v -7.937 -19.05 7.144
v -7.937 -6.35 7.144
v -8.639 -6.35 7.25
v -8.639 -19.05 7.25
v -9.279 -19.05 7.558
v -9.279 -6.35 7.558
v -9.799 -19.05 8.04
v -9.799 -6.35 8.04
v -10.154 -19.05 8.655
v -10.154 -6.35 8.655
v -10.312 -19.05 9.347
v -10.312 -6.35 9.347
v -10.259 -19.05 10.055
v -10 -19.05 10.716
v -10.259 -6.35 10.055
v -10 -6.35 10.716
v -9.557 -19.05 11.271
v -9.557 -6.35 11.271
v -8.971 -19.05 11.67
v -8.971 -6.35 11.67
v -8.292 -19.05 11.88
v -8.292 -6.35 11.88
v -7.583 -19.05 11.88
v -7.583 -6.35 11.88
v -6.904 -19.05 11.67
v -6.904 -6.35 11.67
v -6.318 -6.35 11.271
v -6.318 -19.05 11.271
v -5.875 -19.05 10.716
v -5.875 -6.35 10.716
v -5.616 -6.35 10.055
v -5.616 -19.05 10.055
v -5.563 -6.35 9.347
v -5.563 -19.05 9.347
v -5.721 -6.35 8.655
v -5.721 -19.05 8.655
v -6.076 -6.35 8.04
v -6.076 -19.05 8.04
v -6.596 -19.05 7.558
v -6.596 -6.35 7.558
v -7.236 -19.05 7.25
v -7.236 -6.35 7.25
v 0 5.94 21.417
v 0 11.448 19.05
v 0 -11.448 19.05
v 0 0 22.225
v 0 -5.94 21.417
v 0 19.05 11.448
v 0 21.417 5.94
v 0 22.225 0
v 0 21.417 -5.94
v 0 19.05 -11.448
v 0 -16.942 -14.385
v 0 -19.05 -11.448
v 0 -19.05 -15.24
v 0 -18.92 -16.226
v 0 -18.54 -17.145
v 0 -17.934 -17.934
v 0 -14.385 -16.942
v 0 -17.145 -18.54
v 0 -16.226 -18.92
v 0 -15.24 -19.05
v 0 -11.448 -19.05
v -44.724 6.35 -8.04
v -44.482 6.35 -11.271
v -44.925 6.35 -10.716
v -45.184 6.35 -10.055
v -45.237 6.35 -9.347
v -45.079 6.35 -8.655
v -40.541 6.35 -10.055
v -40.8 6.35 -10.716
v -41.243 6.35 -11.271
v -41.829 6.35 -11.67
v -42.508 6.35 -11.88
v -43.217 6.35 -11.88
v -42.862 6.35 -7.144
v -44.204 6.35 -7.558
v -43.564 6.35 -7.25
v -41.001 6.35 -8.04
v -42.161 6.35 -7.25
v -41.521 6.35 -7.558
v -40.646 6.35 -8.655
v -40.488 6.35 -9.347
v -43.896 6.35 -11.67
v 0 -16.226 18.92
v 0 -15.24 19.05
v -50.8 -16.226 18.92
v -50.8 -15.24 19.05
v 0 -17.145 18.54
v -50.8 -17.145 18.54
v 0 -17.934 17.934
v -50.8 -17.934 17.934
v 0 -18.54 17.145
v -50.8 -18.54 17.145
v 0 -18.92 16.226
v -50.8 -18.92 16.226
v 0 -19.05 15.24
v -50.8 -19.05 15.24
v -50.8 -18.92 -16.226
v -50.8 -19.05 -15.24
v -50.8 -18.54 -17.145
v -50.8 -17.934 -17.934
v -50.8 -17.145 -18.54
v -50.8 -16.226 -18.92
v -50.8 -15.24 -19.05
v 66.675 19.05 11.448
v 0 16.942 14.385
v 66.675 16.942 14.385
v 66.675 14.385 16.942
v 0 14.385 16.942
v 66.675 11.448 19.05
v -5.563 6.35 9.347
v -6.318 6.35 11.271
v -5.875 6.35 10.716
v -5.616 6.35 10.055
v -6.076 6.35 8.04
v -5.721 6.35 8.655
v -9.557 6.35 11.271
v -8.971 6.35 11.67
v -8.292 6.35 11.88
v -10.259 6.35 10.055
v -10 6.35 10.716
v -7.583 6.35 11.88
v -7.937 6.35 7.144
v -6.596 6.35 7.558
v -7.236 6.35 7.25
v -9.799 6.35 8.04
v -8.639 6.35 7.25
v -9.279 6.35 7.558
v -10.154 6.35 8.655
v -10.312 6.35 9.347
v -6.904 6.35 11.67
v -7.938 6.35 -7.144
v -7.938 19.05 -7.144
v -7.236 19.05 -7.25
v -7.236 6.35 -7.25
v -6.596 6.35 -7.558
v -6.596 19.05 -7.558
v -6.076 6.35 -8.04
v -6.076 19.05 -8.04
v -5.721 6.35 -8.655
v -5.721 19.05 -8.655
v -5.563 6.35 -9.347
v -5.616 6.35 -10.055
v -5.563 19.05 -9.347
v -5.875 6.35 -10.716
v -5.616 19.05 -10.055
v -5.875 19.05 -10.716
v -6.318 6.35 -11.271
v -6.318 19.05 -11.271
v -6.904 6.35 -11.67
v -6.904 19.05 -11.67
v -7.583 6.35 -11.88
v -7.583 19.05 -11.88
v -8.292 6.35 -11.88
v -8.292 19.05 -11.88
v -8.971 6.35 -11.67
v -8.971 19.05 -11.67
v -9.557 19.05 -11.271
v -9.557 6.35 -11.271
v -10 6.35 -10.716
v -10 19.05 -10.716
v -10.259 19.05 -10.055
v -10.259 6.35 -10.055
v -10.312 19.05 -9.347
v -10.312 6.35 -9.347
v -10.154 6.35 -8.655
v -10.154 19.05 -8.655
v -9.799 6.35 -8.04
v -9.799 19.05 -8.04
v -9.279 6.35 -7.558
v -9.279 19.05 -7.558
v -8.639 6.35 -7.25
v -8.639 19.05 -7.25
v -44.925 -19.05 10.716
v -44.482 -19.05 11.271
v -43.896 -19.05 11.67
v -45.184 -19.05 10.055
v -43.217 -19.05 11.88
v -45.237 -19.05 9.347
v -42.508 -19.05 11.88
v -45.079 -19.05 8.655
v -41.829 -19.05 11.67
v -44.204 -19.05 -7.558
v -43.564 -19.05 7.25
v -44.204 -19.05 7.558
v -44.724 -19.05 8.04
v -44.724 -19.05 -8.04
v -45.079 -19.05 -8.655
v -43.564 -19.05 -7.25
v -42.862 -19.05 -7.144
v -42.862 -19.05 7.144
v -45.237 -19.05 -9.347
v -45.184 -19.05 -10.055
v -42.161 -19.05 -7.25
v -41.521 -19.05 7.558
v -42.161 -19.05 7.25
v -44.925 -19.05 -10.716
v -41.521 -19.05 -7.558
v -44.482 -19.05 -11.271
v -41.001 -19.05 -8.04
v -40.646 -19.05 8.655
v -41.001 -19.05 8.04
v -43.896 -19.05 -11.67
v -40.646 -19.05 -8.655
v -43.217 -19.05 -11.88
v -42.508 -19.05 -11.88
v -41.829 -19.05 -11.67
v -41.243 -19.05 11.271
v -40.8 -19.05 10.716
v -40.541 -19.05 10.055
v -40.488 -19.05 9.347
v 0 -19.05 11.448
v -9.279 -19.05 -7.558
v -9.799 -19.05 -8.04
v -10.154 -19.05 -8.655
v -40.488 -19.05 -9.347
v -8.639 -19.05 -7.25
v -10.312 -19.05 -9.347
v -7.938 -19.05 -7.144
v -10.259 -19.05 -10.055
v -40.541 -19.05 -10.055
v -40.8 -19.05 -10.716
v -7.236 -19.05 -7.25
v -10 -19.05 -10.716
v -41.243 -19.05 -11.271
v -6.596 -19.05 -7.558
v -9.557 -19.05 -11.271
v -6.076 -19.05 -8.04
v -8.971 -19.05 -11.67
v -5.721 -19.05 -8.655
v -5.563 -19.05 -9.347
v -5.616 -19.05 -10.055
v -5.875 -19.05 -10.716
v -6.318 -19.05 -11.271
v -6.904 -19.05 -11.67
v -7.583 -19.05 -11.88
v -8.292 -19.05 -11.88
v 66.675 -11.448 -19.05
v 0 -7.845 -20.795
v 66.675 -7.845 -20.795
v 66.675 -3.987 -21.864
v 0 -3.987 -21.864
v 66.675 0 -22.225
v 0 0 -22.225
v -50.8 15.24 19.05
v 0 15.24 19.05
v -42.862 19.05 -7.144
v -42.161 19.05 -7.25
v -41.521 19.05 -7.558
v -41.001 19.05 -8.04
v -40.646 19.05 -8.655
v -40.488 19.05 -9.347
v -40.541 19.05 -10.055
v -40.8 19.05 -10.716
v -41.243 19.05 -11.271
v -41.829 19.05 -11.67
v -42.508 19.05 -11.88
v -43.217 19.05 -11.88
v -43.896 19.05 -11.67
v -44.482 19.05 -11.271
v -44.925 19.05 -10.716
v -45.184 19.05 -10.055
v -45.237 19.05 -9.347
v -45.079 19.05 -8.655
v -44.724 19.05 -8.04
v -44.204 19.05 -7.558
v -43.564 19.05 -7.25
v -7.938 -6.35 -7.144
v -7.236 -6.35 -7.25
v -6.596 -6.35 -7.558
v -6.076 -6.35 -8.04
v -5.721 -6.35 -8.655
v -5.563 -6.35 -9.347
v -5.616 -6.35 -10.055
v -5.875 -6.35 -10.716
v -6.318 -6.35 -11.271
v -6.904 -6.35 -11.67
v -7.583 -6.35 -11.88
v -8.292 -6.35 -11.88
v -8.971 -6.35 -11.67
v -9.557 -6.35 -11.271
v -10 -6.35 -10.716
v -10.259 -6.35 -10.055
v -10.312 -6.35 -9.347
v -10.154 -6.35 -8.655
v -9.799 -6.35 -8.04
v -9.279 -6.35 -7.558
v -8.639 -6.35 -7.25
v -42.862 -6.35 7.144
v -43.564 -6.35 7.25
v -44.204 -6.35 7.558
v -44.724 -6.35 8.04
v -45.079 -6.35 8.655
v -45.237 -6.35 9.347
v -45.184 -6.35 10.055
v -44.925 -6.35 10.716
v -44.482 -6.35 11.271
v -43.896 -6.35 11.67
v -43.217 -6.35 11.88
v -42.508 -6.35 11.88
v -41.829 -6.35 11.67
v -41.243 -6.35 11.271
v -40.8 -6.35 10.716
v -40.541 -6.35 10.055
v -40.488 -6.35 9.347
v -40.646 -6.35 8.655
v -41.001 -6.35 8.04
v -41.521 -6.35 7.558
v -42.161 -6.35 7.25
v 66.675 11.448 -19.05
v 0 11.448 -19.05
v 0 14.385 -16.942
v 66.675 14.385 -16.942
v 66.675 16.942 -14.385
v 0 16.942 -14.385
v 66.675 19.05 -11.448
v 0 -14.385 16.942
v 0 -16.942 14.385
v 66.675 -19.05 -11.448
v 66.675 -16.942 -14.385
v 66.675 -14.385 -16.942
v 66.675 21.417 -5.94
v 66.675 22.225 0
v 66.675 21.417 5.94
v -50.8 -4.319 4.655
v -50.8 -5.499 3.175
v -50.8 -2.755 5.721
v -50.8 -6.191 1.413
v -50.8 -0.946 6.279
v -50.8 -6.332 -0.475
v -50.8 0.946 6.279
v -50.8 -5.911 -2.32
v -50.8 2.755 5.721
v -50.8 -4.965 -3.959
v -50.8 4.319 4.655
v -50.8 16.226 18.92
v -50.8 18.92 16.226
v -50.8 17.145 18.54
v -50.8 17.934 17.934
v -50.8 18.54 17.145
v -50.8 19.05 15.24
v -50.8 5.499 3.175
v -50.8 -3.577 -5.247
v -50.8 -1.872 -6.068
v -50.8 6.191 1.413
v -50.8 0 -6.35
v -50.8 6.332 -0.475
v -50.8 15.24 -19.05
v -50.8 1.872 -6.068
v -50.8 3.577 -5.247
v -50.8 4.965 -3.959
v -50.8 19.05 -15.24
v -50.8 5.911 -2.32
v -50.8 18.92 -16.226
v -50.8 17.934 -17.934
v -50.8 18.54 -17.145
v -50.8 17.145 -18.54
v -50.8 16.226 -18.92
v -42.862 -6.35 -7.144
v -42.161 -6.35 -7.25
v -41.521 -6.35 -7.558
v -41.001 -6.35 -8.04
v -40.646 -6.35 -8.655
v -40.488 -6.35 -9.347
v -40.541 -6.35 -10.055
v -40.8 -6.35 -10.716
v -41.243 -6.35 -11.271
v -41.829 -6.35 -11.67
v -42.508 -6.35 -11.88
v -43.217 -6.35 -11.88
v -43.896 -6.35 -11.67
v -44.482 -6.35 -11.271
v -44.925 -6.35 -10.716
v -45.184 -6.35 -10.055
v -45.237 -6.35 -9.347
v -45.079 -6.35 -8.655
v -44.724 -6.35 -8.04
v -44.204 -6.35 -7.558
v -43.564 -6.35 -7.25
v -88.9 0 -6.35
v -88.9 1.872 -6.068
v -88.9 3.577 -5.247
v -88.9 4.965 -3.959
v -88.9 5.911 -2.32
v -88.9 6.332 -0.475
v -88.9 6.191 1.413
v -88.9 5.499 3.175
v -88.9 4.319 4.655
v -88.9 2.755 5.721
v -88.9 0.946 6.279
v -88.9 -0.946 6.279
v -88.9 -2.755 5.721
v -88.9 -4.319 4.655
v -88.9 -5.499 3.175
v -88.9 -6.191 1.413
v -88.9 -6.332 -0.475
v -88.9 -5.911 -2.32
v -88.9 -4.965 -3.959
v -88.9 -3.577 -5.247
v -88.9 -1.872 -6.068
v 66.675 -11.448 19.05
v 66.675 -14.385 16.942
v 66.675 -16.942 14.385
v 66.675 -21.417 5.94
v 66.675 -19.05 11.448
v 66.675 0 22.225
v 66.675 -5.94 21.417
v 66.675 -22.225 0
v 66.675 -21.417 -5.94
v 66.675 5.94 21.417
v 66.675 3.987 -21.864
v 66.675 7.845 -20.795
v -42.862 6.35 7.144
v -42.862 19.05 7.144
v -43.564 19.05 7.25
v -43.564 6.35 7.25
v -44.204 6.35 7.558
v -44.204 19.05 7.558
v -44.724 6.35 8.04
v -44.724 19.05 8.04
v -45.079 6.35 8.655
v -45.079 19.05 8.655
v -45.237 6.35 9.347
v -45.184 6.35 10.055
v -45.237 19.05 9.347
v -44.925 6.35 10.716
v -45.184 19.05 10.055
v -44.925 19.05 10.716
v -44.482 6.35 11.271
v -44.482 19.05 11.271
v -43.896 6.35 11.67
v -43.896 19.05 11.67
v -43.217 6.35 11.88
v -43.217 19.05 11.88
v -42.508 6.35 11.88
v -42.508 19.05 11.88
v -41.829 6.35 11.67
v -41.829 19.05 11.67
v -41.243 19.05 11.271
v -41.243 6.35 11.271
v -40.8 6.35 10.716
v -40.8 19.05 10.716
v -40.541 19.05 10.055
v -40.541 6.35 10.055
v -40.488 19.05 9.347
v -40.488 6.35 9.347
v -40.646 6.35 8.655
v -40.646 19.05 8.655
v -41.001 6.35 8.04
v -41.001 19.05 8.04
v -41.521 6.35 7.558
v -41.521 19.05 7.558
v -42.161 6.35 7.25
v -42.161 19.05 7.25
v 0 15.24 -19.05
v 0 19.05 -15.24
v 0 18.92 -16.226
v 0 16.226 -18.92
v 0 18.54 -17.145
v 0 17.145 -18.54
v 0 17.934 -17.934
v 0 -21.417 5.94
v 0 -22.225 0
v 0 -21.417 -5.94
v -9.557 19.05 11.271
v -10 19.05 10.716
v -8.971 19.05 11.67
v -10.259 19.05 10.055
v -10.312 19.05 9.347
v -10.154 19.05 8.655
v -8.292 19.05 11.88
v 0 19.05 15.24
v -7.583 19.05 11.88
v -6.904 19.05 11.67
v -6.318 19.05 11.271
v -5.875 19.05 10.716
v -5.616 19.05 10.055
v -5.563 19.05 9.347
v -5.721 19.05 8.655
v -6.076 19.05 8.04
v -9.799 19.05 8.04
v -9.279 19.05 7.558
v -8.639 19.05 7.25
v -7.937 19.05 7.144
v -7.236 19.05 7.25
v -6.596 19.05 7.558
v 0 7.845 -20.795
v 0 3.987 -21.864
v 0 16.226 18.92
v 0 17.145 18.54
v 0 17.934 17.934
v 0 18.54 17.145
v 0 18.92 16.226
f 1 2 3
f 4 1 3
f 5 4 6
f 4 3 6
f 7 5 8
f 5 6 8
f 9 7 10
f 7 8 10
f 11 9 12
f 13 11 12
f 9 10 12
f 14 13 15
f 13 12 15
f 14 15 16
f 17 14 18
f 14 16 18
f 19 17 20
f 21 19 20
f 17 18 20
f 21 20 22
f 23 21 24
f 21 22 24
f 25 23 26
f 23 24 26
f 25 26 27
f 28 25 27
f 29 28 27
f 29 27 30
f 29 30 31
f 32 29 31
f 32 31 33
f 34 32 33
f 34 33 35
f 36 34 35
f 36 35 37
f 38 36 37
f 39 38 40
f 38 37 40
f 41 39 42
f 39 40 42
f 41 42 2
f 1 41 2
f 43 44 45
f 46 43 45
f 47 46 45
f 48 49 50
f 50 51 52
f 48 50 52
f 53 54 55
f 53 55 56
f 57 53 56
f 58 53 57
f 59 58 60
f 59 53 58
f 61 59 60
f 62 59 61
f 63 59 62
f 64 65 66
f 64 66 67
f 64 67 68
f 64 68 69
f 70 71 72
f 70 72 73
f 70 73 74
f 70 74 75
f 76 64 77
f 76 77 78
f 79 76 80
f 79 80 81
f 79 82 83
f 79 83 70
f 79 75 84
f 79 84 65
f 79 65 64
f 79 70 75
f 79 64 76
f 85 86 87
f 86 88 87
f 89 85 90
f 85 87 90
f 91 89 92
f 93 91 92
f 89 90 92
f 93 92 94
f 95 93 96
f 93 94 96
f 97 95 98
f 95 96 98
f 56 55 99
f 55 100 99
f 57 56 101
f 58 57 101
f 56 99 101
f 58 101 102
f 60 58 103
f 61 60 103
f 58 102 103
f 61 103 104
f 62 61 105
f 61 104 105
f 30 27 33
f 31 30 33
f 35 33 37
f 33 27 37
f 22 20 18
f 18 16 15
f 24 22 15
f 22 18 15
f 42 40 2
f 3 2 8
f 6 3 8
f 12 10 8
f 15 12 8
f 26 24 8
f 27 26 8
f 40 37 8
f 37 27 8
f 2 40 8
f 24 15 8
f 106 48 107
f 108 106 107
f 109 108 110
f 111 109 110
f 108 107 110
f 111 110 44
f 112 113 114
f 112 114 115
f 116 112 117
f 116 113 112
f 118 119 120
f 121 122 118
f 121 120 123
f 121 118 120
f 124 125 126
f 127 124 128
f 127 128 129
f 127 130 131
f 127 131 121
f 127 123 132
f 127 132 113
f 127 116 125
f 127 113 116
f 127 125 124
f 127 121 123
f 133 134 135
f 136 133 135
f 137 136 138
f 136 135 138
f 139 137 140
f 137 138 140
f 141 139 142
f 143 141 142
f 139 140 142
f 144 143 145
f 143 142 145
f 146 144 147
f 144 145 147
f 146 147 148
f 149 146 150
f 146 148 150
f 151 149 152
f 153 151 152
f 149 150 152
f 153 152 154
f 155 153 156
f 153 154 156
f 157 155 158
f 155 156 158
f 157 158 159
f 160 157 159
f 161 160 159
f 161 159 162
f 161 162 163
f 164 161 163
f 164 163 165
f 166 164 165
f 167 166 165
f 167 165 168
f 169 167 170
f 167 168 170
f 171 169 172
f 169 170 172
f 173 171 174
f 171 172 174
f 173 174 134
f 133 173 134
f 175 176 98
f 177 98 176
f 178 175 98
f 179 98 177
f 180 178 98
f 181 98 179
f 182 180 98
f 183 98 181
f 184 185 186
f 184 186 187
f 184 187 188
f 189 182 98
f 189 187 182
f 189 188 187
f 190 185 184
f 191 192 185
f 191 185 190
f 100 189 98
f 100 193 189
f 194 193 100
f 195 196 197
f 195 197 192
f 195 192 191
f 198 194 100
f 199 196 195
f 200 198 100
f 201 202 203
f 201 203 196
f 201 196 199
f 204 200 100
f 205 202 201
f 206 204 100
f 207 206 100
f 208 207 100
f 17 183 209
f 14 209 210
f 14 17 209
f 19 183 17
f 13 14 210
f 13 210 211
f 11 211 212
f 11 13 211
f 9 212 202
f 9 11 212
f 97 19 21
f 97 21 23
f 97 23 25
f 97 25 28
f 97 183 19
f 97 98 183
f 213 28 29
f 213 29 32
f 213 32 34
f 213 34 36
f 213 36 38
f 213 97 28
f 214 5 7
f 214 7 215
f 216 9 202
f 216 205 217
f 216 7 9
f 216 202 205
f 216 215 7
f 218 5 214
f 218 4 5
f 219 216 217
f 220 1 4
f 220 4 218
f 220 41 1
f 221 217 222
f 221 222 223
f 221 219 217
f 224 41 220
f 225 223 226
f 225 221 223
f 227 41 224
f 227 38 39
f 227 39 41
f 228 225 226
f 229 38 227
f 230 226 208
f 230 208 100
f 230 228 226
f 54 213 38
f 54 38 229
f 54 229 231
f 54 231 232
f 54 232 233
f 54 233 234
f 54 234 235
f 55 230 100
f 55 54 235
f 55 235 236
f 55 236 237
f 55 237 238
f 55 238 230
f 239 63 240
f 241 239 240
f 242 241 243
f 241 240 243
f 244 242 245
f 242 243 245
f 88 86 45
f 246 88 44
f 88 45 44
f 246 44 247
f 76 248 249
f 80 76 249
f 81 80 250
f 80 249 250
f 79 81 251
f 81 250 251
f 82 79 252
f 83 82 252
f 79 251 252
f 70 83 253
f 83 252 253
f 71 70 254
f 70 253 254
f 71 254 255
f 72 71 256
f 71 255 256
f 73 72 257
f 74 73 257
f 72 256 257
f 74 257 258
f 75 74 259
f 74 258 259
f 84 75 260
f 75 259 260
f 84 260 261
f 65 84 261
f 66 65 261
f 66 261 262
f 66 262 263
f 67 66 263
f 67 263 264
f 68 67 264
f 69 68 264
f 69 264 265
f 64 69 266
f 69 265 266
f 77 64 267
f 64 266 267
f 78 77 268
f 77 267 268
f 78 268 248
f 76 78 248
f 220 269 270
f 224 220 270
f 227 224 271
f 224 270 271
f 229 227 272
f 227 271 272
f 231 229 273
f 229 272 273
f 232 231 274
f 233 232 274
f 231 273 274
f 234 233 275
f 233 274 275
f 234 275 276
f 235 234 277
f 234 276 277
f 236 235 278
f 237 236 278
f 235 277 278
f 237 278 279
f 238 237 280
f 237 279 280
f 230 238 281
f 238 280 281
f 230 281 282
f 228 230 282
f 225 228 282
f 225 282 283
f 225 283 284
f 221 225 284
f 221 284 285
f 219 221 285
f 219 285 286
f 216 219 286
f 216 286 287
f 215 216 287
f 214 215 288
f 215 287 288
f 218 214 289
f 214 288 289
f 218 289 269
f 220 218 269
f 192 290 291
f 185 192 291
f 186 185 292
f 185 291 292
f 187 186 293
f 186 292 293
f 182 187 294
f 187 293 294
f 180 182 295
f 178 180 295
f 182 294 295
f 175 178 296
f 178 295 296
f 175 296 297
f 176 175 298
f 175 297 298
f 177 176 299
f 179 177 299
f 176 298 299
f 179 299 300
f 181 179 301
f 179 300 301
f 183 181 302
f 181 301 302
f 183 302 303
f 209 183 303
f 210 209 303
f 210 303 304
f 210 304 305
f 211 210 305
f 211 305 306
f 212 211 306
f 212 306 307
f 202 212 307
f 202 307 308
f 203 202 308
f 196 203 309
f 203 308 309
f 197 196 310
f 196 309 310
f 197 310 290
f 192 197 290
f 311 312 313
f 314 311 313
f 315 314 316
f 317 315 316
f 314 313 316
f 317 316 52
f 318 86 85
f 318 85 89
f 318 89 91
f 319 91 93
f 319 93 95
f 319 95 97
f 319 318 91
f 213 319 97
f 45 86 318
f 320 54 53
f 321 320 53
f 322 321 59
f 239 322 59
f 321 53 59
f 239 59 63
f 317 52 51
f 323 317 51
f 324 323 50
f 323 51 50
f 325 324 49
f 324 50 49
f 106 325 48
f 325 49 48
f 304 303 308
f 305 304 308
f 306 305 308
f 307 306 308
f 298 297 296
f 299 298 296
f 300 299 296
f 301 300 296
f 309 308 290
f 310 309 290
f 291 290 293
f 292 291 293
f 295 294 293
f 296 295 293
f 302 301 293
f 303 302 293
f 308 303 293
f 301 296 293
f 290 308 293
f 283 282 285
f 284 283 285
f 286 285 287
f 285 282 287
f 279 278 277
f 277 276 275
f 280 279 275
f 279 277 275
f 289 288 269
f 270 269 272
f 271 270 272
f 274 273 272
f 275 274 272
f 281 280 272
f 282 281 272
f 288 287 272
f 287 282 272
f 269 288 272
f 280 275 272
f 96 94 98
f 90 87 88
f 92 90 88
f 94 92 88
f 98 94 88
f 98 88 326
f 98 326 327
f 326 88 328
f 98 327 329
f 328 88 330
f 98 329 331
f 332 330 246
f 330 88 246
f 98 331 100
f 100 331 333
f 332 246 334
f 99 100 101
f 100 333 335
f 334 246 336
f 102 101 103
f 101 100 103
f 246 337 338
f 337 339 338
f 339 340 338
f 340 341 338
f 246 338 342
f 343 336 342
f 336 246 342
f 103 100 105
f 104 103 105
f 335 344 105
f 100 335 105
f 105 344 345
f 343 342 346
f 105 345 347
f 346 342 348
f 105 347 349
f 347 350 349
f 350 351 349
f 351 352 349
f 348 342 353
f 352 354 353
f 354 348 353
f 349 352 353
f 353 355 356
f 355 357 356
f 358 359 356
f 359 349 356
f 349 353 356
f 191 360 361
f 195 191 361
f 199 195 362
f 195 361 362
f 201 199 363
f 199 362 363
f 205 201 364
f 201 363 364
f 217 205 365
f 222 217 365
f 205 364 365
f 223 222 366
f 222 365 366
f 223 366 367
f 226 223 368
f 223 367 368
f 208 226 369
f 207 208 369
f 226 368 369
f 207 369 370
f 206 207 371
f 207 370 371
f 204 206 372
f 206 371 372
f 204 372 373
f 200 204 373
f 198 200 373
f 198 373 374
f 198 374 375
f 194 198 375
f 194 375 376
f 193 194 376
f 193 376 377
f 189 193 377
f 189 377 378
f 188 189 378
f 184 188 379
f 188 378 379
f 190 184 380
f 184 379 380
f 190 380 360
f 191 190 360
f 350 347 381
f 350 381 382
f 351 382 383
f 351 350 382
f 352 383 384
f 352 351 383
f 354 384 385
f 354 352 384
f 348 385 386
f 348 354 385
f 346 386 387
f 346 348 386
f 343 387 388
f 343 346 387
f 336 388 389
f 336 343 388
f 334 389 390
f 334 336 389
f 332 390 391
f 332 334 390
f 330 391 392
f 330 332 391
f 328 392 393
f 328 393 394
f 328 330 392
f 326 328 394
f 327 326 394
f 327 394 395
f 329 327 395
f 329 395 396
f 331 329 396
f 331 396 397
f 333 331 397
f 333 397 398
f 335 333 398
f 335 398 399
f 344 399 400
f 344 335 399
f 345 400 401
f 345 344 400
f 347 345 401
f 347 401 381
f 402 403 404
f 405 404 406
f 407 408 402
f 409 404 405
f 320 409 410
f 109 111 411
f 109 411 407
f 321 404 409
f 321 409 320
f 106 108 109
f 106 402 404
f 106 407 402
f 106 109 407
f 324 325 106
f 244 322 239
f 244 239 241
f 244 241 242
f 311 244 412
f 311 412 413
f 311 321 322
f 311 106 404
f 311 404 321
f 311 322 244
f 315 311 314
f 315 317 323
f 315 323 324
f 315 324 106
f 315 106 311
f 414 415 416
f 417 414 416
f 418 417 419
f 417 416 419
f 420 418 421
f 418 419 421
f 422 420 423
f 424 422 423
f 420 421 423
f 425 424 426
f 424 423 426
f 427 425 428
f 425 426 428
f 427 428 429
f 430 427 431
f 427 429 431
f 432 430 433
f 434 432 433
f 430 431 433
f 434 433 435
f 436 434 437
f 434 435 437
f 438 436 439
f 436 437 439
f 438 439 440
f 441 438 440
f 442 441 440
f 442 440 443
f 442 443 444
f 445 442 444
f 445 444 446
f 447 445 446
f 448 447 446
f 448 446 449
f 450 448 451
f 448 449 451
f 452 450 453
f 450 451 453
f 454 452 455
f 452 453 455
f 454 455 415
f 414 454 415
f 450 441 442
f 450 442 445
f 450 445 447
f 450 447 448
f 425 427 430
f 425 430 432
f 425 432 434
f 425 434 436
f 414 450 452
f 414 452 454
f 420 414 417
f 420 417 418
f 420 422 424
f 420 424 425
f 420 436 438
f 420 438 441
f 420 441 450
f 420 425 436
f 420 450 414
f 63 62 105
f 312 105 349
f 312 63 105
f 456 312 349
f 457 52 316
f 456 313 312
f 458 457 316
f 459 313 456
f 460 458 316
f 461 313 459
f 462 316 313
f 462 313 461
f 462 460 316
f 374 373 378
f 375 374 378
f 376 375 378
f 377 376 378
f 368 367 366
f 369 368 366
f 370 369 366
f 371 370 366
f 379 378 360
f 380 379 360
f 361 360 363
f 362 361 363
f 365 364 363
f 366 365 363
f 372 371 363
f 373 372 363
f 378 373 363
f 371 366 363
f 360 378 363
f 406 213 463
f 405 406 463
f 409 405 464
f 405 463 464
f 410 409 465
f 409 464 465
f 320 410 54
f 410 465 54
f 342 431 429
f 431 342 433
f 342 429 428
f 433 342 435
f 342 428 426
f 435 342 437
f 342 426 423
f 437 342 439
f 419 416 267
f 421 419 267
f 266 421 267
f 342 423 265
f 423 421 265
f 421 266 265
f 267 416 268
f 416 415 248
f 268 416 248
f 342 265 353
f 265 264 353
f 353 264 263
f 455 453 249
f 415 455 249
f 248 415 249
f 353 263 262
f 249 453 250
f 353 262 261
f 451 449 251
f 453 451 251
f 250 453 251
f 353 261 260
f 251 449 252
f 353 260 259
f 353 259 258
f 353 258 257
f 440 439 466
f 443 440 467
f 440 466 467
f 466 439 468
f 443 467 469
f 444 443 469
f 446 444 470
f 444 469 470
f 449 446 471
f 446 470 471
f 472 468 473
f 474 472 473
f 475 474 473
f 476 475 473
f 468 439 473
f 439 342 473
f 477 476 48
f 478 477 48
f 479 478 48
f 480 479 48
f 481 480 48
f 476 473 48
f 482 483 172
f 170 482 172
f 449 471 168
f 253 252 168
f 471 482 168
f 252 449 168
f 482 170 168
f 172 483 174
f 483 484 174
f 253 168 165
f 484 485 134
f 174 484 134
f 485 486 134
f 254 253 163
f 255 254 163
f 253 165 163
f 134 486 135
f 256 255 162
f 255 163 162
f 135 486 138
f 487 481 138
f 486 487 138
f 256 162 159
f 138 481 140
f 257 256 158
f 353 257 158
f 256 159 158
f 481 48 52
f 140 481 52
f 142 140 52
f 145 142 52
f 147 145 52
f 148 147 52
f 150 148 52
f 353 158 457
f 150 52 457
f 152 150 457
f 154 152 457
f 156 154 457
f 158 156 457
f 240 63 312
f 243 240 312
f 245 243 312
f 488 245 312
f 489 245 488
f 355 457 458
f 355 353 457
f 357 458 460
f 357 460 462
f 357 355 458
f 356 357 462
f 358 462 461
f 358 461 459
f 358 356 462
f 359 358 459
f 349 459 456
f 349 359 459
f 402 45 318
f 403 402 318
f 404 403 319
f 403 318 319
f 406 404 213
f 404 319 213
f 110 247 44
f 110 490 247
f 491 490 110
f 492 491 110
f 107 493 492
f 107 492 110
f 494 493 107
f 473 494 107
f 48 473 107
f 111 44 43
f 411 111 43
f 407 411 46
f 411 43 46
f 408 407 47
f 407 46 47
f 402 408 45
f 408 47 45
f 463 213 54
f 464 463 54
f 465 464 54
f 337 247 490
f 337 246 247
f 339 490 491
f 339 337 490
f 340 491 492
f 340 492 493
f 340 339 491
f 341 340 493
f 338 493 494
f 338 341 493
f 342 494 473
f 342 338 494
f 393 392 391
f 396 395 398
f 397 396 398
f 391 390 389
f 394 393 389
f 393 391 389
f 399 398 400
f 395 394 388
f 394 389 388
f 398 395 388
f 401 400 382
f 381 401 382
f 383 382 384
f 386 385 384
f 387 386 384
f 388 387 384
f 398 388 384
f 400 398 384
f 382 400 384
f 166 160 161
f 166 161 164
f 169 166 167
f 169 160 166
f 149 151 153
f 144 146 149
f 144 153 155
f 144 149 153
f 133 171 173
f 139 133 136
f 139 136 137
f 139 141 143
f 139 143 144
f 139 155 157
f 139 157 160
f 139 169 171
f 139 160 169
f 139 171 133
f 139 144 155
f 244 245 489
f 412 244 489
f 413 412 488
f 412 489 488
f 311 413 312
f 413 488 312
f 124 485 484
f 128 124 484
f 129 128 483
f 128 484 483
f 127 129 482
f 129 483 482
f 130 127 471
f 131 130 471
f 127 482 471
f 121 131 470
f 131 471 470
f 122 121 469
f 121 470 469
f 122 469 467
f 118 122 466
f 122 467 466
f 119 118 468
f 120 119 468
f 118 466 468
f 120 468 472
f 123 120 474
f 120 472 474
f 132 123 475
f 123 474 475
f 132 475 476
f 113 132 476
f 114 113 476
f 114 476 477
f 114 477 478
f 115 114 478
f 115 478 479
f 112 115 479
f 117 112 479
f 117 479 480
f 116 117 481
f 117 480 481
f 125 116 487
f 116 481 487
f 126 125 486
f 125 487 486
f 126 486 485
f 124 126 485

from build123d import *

# Parameters (mm, degrees)
SKETCH1_R           = 22.225
SKETCH1_R_2         = 6.35
BOSS_EXTRUDE1_DEPTH = 66.675
SKETCH1_3_W         = 38.1
SKETCH1_3_H         = 38.1
BOSS_EXTRUDE2_DEPTH = 50.8
BOSS_EXTRUDE3_START = -50.8
SKETCH1_4_R         = 6.35
BOSS_EXTRUDE3_DEPTH = 38.1
SKETCH2_R           = 2.38125
CUT_EXTRUDE1_DEPTH  = 12.7
CUT_EXTRUDE2_START  = -25.4
SKETCH2_2_R         = 2.38125
CUT_EXTRUDE2_DEPTH  = 12.7
FILLET1_R           = 3.81


with BuildPart() as part:
    # Sketch1 → Boss-Extrude1 (new body)
    with BuildSketch(Plane(origin=(0, 0, 0), x_dir=(0, 0, -1), z_dir=(1, 0, 0))):
        Circle(SKETCH1_R)
        Circle(SKETCH1_R_2)
        with BuildLine():
            ThreePointArc((11.4476253, 19.05), (0, 22.225), (-11.4476253, 19.05))
            Line((-11.4476253, 19.05), (11.4476253, 19.05))
        make_face()
        with BuildLine():
            Line((19.05, 11.4476253), (19.05, -11.4476253))
            ThreePointArc((19.05, -11.4476253), (21.416545882, -5.939881102), (22.225, 0))
            ThreePointArc((22.225, 0), (21.416545882, 5.939881102), (19.05, 11.4476253))
        make_face()
        with BuildLine():
            Line((11.4476253, -19.05), (-11.4476253, -19.05))
            ThreePointArc((-11.4476253, -19.05), (0, -22.225), (11.4476253, -19.05))
        make_face()
        with BuildLine():
            ThreePointArc((-19.05, 11.4476253), (-22.225, 0), (-19.05, -11.4476253))
            Line((-19.05, -11.4476253), (-19.05, 11.4476253))
        make_face()
    extrude(amount=BOSS_EXTRUDE1_DEPTH)

    # Sketch1<3> → Boss-Extrude2 (add)
    with BuildSketch(Plane(origin=(0, 0, 0), x_dir=(0, 0, -1), z_dir=(1, 0, 0))):
        Rectangle(SKETCH1_3_W, SKETCH1_3_H)
    extrude(amount=-BOSS_EXTRUDE2_DEPTH)

    # Sketch1<4> → Boss-Extrude3 (add)
    with BuildSketch(Plane(origin=(0, 0, 0), x_dir=(0, 0, -1), z_dir=(1, 0, 0)).offset(BOSS_EXTRUDE3_START)):
        Circle(SKETCH1_4_R)
    extrude(amount=-BOSS_EXTRUDE3_DEPTH)

    # Sketch2 → Cut-Extrude1 (cut)
    with BuildSketch(Plane(origin=(0, 19.05, 0), x_dir=(1, 0, 0), z_dir=(0, 1, 0))):
        with Locations(Location((-42.8625, 9.525, 0), (0, 0, 270))):
            Circle(SKETCH2_R)
        with Locations(Location((-7.9375, 9.525, 0), (0, 0, 270))):
            Circle(SKETCH2_R)
        with Locations(Location((-7.9375, -9.525, 0), (0, 0, 90))):
            Circle(SKETCH2_R)
        with Locations(Location((-42.8625, -9.525, 0), (0, 0, 90))):
            Circle(SKETCH2_R)
    extrude(amount=-CUT_EXTRUDE1_DEPTH, mode=Mode.SUBTRACT)

    # Sketch2<2> → Cut-Extrude2 (cut)
    with BuildSketch(Plane(origin=(0, 19.05, 0), x_dir=(1, 0, 0), z_dir=(0, 1, 0)).offset(CUT_EXTRUDE2_START)):
        with Locations(Location((-42.8625, 9.525, 0), (0, 0, 270))):
            Circle(SKETCH2_2_R)
        with Locations(Location((-7.9375, 9.525, 0), (0, 0, 270))):
            Circle(SKETCH2_2_R)
        with Locations(Location((-7.9375, -9.525, 0), (0, 0, 90))):
            Circle(SKETCH2_2_R)
        with Locations(Location((-42.8625, -9.525, 0), (0, 0, 90))):
            Circle(SKETCH2_2_R)
    extrude(amount=-CUT_EXTRUDE2_DEPTH, mode=Mode.SUBTRACT)

    # Fillet1
    fillet1_edges = [part.edges().sort_by_distance(p)[0] for p in [
        (-25.4, 19.05, 19.05),
        (-25.4, 19.05, -19.05),
        (-25.4, -19.05, -19.05),
        (-25.4, -19.05, 19.05),
    ]]
    fillet(fillet1_edges, radius=FILLET1_R)


solid = part.part
